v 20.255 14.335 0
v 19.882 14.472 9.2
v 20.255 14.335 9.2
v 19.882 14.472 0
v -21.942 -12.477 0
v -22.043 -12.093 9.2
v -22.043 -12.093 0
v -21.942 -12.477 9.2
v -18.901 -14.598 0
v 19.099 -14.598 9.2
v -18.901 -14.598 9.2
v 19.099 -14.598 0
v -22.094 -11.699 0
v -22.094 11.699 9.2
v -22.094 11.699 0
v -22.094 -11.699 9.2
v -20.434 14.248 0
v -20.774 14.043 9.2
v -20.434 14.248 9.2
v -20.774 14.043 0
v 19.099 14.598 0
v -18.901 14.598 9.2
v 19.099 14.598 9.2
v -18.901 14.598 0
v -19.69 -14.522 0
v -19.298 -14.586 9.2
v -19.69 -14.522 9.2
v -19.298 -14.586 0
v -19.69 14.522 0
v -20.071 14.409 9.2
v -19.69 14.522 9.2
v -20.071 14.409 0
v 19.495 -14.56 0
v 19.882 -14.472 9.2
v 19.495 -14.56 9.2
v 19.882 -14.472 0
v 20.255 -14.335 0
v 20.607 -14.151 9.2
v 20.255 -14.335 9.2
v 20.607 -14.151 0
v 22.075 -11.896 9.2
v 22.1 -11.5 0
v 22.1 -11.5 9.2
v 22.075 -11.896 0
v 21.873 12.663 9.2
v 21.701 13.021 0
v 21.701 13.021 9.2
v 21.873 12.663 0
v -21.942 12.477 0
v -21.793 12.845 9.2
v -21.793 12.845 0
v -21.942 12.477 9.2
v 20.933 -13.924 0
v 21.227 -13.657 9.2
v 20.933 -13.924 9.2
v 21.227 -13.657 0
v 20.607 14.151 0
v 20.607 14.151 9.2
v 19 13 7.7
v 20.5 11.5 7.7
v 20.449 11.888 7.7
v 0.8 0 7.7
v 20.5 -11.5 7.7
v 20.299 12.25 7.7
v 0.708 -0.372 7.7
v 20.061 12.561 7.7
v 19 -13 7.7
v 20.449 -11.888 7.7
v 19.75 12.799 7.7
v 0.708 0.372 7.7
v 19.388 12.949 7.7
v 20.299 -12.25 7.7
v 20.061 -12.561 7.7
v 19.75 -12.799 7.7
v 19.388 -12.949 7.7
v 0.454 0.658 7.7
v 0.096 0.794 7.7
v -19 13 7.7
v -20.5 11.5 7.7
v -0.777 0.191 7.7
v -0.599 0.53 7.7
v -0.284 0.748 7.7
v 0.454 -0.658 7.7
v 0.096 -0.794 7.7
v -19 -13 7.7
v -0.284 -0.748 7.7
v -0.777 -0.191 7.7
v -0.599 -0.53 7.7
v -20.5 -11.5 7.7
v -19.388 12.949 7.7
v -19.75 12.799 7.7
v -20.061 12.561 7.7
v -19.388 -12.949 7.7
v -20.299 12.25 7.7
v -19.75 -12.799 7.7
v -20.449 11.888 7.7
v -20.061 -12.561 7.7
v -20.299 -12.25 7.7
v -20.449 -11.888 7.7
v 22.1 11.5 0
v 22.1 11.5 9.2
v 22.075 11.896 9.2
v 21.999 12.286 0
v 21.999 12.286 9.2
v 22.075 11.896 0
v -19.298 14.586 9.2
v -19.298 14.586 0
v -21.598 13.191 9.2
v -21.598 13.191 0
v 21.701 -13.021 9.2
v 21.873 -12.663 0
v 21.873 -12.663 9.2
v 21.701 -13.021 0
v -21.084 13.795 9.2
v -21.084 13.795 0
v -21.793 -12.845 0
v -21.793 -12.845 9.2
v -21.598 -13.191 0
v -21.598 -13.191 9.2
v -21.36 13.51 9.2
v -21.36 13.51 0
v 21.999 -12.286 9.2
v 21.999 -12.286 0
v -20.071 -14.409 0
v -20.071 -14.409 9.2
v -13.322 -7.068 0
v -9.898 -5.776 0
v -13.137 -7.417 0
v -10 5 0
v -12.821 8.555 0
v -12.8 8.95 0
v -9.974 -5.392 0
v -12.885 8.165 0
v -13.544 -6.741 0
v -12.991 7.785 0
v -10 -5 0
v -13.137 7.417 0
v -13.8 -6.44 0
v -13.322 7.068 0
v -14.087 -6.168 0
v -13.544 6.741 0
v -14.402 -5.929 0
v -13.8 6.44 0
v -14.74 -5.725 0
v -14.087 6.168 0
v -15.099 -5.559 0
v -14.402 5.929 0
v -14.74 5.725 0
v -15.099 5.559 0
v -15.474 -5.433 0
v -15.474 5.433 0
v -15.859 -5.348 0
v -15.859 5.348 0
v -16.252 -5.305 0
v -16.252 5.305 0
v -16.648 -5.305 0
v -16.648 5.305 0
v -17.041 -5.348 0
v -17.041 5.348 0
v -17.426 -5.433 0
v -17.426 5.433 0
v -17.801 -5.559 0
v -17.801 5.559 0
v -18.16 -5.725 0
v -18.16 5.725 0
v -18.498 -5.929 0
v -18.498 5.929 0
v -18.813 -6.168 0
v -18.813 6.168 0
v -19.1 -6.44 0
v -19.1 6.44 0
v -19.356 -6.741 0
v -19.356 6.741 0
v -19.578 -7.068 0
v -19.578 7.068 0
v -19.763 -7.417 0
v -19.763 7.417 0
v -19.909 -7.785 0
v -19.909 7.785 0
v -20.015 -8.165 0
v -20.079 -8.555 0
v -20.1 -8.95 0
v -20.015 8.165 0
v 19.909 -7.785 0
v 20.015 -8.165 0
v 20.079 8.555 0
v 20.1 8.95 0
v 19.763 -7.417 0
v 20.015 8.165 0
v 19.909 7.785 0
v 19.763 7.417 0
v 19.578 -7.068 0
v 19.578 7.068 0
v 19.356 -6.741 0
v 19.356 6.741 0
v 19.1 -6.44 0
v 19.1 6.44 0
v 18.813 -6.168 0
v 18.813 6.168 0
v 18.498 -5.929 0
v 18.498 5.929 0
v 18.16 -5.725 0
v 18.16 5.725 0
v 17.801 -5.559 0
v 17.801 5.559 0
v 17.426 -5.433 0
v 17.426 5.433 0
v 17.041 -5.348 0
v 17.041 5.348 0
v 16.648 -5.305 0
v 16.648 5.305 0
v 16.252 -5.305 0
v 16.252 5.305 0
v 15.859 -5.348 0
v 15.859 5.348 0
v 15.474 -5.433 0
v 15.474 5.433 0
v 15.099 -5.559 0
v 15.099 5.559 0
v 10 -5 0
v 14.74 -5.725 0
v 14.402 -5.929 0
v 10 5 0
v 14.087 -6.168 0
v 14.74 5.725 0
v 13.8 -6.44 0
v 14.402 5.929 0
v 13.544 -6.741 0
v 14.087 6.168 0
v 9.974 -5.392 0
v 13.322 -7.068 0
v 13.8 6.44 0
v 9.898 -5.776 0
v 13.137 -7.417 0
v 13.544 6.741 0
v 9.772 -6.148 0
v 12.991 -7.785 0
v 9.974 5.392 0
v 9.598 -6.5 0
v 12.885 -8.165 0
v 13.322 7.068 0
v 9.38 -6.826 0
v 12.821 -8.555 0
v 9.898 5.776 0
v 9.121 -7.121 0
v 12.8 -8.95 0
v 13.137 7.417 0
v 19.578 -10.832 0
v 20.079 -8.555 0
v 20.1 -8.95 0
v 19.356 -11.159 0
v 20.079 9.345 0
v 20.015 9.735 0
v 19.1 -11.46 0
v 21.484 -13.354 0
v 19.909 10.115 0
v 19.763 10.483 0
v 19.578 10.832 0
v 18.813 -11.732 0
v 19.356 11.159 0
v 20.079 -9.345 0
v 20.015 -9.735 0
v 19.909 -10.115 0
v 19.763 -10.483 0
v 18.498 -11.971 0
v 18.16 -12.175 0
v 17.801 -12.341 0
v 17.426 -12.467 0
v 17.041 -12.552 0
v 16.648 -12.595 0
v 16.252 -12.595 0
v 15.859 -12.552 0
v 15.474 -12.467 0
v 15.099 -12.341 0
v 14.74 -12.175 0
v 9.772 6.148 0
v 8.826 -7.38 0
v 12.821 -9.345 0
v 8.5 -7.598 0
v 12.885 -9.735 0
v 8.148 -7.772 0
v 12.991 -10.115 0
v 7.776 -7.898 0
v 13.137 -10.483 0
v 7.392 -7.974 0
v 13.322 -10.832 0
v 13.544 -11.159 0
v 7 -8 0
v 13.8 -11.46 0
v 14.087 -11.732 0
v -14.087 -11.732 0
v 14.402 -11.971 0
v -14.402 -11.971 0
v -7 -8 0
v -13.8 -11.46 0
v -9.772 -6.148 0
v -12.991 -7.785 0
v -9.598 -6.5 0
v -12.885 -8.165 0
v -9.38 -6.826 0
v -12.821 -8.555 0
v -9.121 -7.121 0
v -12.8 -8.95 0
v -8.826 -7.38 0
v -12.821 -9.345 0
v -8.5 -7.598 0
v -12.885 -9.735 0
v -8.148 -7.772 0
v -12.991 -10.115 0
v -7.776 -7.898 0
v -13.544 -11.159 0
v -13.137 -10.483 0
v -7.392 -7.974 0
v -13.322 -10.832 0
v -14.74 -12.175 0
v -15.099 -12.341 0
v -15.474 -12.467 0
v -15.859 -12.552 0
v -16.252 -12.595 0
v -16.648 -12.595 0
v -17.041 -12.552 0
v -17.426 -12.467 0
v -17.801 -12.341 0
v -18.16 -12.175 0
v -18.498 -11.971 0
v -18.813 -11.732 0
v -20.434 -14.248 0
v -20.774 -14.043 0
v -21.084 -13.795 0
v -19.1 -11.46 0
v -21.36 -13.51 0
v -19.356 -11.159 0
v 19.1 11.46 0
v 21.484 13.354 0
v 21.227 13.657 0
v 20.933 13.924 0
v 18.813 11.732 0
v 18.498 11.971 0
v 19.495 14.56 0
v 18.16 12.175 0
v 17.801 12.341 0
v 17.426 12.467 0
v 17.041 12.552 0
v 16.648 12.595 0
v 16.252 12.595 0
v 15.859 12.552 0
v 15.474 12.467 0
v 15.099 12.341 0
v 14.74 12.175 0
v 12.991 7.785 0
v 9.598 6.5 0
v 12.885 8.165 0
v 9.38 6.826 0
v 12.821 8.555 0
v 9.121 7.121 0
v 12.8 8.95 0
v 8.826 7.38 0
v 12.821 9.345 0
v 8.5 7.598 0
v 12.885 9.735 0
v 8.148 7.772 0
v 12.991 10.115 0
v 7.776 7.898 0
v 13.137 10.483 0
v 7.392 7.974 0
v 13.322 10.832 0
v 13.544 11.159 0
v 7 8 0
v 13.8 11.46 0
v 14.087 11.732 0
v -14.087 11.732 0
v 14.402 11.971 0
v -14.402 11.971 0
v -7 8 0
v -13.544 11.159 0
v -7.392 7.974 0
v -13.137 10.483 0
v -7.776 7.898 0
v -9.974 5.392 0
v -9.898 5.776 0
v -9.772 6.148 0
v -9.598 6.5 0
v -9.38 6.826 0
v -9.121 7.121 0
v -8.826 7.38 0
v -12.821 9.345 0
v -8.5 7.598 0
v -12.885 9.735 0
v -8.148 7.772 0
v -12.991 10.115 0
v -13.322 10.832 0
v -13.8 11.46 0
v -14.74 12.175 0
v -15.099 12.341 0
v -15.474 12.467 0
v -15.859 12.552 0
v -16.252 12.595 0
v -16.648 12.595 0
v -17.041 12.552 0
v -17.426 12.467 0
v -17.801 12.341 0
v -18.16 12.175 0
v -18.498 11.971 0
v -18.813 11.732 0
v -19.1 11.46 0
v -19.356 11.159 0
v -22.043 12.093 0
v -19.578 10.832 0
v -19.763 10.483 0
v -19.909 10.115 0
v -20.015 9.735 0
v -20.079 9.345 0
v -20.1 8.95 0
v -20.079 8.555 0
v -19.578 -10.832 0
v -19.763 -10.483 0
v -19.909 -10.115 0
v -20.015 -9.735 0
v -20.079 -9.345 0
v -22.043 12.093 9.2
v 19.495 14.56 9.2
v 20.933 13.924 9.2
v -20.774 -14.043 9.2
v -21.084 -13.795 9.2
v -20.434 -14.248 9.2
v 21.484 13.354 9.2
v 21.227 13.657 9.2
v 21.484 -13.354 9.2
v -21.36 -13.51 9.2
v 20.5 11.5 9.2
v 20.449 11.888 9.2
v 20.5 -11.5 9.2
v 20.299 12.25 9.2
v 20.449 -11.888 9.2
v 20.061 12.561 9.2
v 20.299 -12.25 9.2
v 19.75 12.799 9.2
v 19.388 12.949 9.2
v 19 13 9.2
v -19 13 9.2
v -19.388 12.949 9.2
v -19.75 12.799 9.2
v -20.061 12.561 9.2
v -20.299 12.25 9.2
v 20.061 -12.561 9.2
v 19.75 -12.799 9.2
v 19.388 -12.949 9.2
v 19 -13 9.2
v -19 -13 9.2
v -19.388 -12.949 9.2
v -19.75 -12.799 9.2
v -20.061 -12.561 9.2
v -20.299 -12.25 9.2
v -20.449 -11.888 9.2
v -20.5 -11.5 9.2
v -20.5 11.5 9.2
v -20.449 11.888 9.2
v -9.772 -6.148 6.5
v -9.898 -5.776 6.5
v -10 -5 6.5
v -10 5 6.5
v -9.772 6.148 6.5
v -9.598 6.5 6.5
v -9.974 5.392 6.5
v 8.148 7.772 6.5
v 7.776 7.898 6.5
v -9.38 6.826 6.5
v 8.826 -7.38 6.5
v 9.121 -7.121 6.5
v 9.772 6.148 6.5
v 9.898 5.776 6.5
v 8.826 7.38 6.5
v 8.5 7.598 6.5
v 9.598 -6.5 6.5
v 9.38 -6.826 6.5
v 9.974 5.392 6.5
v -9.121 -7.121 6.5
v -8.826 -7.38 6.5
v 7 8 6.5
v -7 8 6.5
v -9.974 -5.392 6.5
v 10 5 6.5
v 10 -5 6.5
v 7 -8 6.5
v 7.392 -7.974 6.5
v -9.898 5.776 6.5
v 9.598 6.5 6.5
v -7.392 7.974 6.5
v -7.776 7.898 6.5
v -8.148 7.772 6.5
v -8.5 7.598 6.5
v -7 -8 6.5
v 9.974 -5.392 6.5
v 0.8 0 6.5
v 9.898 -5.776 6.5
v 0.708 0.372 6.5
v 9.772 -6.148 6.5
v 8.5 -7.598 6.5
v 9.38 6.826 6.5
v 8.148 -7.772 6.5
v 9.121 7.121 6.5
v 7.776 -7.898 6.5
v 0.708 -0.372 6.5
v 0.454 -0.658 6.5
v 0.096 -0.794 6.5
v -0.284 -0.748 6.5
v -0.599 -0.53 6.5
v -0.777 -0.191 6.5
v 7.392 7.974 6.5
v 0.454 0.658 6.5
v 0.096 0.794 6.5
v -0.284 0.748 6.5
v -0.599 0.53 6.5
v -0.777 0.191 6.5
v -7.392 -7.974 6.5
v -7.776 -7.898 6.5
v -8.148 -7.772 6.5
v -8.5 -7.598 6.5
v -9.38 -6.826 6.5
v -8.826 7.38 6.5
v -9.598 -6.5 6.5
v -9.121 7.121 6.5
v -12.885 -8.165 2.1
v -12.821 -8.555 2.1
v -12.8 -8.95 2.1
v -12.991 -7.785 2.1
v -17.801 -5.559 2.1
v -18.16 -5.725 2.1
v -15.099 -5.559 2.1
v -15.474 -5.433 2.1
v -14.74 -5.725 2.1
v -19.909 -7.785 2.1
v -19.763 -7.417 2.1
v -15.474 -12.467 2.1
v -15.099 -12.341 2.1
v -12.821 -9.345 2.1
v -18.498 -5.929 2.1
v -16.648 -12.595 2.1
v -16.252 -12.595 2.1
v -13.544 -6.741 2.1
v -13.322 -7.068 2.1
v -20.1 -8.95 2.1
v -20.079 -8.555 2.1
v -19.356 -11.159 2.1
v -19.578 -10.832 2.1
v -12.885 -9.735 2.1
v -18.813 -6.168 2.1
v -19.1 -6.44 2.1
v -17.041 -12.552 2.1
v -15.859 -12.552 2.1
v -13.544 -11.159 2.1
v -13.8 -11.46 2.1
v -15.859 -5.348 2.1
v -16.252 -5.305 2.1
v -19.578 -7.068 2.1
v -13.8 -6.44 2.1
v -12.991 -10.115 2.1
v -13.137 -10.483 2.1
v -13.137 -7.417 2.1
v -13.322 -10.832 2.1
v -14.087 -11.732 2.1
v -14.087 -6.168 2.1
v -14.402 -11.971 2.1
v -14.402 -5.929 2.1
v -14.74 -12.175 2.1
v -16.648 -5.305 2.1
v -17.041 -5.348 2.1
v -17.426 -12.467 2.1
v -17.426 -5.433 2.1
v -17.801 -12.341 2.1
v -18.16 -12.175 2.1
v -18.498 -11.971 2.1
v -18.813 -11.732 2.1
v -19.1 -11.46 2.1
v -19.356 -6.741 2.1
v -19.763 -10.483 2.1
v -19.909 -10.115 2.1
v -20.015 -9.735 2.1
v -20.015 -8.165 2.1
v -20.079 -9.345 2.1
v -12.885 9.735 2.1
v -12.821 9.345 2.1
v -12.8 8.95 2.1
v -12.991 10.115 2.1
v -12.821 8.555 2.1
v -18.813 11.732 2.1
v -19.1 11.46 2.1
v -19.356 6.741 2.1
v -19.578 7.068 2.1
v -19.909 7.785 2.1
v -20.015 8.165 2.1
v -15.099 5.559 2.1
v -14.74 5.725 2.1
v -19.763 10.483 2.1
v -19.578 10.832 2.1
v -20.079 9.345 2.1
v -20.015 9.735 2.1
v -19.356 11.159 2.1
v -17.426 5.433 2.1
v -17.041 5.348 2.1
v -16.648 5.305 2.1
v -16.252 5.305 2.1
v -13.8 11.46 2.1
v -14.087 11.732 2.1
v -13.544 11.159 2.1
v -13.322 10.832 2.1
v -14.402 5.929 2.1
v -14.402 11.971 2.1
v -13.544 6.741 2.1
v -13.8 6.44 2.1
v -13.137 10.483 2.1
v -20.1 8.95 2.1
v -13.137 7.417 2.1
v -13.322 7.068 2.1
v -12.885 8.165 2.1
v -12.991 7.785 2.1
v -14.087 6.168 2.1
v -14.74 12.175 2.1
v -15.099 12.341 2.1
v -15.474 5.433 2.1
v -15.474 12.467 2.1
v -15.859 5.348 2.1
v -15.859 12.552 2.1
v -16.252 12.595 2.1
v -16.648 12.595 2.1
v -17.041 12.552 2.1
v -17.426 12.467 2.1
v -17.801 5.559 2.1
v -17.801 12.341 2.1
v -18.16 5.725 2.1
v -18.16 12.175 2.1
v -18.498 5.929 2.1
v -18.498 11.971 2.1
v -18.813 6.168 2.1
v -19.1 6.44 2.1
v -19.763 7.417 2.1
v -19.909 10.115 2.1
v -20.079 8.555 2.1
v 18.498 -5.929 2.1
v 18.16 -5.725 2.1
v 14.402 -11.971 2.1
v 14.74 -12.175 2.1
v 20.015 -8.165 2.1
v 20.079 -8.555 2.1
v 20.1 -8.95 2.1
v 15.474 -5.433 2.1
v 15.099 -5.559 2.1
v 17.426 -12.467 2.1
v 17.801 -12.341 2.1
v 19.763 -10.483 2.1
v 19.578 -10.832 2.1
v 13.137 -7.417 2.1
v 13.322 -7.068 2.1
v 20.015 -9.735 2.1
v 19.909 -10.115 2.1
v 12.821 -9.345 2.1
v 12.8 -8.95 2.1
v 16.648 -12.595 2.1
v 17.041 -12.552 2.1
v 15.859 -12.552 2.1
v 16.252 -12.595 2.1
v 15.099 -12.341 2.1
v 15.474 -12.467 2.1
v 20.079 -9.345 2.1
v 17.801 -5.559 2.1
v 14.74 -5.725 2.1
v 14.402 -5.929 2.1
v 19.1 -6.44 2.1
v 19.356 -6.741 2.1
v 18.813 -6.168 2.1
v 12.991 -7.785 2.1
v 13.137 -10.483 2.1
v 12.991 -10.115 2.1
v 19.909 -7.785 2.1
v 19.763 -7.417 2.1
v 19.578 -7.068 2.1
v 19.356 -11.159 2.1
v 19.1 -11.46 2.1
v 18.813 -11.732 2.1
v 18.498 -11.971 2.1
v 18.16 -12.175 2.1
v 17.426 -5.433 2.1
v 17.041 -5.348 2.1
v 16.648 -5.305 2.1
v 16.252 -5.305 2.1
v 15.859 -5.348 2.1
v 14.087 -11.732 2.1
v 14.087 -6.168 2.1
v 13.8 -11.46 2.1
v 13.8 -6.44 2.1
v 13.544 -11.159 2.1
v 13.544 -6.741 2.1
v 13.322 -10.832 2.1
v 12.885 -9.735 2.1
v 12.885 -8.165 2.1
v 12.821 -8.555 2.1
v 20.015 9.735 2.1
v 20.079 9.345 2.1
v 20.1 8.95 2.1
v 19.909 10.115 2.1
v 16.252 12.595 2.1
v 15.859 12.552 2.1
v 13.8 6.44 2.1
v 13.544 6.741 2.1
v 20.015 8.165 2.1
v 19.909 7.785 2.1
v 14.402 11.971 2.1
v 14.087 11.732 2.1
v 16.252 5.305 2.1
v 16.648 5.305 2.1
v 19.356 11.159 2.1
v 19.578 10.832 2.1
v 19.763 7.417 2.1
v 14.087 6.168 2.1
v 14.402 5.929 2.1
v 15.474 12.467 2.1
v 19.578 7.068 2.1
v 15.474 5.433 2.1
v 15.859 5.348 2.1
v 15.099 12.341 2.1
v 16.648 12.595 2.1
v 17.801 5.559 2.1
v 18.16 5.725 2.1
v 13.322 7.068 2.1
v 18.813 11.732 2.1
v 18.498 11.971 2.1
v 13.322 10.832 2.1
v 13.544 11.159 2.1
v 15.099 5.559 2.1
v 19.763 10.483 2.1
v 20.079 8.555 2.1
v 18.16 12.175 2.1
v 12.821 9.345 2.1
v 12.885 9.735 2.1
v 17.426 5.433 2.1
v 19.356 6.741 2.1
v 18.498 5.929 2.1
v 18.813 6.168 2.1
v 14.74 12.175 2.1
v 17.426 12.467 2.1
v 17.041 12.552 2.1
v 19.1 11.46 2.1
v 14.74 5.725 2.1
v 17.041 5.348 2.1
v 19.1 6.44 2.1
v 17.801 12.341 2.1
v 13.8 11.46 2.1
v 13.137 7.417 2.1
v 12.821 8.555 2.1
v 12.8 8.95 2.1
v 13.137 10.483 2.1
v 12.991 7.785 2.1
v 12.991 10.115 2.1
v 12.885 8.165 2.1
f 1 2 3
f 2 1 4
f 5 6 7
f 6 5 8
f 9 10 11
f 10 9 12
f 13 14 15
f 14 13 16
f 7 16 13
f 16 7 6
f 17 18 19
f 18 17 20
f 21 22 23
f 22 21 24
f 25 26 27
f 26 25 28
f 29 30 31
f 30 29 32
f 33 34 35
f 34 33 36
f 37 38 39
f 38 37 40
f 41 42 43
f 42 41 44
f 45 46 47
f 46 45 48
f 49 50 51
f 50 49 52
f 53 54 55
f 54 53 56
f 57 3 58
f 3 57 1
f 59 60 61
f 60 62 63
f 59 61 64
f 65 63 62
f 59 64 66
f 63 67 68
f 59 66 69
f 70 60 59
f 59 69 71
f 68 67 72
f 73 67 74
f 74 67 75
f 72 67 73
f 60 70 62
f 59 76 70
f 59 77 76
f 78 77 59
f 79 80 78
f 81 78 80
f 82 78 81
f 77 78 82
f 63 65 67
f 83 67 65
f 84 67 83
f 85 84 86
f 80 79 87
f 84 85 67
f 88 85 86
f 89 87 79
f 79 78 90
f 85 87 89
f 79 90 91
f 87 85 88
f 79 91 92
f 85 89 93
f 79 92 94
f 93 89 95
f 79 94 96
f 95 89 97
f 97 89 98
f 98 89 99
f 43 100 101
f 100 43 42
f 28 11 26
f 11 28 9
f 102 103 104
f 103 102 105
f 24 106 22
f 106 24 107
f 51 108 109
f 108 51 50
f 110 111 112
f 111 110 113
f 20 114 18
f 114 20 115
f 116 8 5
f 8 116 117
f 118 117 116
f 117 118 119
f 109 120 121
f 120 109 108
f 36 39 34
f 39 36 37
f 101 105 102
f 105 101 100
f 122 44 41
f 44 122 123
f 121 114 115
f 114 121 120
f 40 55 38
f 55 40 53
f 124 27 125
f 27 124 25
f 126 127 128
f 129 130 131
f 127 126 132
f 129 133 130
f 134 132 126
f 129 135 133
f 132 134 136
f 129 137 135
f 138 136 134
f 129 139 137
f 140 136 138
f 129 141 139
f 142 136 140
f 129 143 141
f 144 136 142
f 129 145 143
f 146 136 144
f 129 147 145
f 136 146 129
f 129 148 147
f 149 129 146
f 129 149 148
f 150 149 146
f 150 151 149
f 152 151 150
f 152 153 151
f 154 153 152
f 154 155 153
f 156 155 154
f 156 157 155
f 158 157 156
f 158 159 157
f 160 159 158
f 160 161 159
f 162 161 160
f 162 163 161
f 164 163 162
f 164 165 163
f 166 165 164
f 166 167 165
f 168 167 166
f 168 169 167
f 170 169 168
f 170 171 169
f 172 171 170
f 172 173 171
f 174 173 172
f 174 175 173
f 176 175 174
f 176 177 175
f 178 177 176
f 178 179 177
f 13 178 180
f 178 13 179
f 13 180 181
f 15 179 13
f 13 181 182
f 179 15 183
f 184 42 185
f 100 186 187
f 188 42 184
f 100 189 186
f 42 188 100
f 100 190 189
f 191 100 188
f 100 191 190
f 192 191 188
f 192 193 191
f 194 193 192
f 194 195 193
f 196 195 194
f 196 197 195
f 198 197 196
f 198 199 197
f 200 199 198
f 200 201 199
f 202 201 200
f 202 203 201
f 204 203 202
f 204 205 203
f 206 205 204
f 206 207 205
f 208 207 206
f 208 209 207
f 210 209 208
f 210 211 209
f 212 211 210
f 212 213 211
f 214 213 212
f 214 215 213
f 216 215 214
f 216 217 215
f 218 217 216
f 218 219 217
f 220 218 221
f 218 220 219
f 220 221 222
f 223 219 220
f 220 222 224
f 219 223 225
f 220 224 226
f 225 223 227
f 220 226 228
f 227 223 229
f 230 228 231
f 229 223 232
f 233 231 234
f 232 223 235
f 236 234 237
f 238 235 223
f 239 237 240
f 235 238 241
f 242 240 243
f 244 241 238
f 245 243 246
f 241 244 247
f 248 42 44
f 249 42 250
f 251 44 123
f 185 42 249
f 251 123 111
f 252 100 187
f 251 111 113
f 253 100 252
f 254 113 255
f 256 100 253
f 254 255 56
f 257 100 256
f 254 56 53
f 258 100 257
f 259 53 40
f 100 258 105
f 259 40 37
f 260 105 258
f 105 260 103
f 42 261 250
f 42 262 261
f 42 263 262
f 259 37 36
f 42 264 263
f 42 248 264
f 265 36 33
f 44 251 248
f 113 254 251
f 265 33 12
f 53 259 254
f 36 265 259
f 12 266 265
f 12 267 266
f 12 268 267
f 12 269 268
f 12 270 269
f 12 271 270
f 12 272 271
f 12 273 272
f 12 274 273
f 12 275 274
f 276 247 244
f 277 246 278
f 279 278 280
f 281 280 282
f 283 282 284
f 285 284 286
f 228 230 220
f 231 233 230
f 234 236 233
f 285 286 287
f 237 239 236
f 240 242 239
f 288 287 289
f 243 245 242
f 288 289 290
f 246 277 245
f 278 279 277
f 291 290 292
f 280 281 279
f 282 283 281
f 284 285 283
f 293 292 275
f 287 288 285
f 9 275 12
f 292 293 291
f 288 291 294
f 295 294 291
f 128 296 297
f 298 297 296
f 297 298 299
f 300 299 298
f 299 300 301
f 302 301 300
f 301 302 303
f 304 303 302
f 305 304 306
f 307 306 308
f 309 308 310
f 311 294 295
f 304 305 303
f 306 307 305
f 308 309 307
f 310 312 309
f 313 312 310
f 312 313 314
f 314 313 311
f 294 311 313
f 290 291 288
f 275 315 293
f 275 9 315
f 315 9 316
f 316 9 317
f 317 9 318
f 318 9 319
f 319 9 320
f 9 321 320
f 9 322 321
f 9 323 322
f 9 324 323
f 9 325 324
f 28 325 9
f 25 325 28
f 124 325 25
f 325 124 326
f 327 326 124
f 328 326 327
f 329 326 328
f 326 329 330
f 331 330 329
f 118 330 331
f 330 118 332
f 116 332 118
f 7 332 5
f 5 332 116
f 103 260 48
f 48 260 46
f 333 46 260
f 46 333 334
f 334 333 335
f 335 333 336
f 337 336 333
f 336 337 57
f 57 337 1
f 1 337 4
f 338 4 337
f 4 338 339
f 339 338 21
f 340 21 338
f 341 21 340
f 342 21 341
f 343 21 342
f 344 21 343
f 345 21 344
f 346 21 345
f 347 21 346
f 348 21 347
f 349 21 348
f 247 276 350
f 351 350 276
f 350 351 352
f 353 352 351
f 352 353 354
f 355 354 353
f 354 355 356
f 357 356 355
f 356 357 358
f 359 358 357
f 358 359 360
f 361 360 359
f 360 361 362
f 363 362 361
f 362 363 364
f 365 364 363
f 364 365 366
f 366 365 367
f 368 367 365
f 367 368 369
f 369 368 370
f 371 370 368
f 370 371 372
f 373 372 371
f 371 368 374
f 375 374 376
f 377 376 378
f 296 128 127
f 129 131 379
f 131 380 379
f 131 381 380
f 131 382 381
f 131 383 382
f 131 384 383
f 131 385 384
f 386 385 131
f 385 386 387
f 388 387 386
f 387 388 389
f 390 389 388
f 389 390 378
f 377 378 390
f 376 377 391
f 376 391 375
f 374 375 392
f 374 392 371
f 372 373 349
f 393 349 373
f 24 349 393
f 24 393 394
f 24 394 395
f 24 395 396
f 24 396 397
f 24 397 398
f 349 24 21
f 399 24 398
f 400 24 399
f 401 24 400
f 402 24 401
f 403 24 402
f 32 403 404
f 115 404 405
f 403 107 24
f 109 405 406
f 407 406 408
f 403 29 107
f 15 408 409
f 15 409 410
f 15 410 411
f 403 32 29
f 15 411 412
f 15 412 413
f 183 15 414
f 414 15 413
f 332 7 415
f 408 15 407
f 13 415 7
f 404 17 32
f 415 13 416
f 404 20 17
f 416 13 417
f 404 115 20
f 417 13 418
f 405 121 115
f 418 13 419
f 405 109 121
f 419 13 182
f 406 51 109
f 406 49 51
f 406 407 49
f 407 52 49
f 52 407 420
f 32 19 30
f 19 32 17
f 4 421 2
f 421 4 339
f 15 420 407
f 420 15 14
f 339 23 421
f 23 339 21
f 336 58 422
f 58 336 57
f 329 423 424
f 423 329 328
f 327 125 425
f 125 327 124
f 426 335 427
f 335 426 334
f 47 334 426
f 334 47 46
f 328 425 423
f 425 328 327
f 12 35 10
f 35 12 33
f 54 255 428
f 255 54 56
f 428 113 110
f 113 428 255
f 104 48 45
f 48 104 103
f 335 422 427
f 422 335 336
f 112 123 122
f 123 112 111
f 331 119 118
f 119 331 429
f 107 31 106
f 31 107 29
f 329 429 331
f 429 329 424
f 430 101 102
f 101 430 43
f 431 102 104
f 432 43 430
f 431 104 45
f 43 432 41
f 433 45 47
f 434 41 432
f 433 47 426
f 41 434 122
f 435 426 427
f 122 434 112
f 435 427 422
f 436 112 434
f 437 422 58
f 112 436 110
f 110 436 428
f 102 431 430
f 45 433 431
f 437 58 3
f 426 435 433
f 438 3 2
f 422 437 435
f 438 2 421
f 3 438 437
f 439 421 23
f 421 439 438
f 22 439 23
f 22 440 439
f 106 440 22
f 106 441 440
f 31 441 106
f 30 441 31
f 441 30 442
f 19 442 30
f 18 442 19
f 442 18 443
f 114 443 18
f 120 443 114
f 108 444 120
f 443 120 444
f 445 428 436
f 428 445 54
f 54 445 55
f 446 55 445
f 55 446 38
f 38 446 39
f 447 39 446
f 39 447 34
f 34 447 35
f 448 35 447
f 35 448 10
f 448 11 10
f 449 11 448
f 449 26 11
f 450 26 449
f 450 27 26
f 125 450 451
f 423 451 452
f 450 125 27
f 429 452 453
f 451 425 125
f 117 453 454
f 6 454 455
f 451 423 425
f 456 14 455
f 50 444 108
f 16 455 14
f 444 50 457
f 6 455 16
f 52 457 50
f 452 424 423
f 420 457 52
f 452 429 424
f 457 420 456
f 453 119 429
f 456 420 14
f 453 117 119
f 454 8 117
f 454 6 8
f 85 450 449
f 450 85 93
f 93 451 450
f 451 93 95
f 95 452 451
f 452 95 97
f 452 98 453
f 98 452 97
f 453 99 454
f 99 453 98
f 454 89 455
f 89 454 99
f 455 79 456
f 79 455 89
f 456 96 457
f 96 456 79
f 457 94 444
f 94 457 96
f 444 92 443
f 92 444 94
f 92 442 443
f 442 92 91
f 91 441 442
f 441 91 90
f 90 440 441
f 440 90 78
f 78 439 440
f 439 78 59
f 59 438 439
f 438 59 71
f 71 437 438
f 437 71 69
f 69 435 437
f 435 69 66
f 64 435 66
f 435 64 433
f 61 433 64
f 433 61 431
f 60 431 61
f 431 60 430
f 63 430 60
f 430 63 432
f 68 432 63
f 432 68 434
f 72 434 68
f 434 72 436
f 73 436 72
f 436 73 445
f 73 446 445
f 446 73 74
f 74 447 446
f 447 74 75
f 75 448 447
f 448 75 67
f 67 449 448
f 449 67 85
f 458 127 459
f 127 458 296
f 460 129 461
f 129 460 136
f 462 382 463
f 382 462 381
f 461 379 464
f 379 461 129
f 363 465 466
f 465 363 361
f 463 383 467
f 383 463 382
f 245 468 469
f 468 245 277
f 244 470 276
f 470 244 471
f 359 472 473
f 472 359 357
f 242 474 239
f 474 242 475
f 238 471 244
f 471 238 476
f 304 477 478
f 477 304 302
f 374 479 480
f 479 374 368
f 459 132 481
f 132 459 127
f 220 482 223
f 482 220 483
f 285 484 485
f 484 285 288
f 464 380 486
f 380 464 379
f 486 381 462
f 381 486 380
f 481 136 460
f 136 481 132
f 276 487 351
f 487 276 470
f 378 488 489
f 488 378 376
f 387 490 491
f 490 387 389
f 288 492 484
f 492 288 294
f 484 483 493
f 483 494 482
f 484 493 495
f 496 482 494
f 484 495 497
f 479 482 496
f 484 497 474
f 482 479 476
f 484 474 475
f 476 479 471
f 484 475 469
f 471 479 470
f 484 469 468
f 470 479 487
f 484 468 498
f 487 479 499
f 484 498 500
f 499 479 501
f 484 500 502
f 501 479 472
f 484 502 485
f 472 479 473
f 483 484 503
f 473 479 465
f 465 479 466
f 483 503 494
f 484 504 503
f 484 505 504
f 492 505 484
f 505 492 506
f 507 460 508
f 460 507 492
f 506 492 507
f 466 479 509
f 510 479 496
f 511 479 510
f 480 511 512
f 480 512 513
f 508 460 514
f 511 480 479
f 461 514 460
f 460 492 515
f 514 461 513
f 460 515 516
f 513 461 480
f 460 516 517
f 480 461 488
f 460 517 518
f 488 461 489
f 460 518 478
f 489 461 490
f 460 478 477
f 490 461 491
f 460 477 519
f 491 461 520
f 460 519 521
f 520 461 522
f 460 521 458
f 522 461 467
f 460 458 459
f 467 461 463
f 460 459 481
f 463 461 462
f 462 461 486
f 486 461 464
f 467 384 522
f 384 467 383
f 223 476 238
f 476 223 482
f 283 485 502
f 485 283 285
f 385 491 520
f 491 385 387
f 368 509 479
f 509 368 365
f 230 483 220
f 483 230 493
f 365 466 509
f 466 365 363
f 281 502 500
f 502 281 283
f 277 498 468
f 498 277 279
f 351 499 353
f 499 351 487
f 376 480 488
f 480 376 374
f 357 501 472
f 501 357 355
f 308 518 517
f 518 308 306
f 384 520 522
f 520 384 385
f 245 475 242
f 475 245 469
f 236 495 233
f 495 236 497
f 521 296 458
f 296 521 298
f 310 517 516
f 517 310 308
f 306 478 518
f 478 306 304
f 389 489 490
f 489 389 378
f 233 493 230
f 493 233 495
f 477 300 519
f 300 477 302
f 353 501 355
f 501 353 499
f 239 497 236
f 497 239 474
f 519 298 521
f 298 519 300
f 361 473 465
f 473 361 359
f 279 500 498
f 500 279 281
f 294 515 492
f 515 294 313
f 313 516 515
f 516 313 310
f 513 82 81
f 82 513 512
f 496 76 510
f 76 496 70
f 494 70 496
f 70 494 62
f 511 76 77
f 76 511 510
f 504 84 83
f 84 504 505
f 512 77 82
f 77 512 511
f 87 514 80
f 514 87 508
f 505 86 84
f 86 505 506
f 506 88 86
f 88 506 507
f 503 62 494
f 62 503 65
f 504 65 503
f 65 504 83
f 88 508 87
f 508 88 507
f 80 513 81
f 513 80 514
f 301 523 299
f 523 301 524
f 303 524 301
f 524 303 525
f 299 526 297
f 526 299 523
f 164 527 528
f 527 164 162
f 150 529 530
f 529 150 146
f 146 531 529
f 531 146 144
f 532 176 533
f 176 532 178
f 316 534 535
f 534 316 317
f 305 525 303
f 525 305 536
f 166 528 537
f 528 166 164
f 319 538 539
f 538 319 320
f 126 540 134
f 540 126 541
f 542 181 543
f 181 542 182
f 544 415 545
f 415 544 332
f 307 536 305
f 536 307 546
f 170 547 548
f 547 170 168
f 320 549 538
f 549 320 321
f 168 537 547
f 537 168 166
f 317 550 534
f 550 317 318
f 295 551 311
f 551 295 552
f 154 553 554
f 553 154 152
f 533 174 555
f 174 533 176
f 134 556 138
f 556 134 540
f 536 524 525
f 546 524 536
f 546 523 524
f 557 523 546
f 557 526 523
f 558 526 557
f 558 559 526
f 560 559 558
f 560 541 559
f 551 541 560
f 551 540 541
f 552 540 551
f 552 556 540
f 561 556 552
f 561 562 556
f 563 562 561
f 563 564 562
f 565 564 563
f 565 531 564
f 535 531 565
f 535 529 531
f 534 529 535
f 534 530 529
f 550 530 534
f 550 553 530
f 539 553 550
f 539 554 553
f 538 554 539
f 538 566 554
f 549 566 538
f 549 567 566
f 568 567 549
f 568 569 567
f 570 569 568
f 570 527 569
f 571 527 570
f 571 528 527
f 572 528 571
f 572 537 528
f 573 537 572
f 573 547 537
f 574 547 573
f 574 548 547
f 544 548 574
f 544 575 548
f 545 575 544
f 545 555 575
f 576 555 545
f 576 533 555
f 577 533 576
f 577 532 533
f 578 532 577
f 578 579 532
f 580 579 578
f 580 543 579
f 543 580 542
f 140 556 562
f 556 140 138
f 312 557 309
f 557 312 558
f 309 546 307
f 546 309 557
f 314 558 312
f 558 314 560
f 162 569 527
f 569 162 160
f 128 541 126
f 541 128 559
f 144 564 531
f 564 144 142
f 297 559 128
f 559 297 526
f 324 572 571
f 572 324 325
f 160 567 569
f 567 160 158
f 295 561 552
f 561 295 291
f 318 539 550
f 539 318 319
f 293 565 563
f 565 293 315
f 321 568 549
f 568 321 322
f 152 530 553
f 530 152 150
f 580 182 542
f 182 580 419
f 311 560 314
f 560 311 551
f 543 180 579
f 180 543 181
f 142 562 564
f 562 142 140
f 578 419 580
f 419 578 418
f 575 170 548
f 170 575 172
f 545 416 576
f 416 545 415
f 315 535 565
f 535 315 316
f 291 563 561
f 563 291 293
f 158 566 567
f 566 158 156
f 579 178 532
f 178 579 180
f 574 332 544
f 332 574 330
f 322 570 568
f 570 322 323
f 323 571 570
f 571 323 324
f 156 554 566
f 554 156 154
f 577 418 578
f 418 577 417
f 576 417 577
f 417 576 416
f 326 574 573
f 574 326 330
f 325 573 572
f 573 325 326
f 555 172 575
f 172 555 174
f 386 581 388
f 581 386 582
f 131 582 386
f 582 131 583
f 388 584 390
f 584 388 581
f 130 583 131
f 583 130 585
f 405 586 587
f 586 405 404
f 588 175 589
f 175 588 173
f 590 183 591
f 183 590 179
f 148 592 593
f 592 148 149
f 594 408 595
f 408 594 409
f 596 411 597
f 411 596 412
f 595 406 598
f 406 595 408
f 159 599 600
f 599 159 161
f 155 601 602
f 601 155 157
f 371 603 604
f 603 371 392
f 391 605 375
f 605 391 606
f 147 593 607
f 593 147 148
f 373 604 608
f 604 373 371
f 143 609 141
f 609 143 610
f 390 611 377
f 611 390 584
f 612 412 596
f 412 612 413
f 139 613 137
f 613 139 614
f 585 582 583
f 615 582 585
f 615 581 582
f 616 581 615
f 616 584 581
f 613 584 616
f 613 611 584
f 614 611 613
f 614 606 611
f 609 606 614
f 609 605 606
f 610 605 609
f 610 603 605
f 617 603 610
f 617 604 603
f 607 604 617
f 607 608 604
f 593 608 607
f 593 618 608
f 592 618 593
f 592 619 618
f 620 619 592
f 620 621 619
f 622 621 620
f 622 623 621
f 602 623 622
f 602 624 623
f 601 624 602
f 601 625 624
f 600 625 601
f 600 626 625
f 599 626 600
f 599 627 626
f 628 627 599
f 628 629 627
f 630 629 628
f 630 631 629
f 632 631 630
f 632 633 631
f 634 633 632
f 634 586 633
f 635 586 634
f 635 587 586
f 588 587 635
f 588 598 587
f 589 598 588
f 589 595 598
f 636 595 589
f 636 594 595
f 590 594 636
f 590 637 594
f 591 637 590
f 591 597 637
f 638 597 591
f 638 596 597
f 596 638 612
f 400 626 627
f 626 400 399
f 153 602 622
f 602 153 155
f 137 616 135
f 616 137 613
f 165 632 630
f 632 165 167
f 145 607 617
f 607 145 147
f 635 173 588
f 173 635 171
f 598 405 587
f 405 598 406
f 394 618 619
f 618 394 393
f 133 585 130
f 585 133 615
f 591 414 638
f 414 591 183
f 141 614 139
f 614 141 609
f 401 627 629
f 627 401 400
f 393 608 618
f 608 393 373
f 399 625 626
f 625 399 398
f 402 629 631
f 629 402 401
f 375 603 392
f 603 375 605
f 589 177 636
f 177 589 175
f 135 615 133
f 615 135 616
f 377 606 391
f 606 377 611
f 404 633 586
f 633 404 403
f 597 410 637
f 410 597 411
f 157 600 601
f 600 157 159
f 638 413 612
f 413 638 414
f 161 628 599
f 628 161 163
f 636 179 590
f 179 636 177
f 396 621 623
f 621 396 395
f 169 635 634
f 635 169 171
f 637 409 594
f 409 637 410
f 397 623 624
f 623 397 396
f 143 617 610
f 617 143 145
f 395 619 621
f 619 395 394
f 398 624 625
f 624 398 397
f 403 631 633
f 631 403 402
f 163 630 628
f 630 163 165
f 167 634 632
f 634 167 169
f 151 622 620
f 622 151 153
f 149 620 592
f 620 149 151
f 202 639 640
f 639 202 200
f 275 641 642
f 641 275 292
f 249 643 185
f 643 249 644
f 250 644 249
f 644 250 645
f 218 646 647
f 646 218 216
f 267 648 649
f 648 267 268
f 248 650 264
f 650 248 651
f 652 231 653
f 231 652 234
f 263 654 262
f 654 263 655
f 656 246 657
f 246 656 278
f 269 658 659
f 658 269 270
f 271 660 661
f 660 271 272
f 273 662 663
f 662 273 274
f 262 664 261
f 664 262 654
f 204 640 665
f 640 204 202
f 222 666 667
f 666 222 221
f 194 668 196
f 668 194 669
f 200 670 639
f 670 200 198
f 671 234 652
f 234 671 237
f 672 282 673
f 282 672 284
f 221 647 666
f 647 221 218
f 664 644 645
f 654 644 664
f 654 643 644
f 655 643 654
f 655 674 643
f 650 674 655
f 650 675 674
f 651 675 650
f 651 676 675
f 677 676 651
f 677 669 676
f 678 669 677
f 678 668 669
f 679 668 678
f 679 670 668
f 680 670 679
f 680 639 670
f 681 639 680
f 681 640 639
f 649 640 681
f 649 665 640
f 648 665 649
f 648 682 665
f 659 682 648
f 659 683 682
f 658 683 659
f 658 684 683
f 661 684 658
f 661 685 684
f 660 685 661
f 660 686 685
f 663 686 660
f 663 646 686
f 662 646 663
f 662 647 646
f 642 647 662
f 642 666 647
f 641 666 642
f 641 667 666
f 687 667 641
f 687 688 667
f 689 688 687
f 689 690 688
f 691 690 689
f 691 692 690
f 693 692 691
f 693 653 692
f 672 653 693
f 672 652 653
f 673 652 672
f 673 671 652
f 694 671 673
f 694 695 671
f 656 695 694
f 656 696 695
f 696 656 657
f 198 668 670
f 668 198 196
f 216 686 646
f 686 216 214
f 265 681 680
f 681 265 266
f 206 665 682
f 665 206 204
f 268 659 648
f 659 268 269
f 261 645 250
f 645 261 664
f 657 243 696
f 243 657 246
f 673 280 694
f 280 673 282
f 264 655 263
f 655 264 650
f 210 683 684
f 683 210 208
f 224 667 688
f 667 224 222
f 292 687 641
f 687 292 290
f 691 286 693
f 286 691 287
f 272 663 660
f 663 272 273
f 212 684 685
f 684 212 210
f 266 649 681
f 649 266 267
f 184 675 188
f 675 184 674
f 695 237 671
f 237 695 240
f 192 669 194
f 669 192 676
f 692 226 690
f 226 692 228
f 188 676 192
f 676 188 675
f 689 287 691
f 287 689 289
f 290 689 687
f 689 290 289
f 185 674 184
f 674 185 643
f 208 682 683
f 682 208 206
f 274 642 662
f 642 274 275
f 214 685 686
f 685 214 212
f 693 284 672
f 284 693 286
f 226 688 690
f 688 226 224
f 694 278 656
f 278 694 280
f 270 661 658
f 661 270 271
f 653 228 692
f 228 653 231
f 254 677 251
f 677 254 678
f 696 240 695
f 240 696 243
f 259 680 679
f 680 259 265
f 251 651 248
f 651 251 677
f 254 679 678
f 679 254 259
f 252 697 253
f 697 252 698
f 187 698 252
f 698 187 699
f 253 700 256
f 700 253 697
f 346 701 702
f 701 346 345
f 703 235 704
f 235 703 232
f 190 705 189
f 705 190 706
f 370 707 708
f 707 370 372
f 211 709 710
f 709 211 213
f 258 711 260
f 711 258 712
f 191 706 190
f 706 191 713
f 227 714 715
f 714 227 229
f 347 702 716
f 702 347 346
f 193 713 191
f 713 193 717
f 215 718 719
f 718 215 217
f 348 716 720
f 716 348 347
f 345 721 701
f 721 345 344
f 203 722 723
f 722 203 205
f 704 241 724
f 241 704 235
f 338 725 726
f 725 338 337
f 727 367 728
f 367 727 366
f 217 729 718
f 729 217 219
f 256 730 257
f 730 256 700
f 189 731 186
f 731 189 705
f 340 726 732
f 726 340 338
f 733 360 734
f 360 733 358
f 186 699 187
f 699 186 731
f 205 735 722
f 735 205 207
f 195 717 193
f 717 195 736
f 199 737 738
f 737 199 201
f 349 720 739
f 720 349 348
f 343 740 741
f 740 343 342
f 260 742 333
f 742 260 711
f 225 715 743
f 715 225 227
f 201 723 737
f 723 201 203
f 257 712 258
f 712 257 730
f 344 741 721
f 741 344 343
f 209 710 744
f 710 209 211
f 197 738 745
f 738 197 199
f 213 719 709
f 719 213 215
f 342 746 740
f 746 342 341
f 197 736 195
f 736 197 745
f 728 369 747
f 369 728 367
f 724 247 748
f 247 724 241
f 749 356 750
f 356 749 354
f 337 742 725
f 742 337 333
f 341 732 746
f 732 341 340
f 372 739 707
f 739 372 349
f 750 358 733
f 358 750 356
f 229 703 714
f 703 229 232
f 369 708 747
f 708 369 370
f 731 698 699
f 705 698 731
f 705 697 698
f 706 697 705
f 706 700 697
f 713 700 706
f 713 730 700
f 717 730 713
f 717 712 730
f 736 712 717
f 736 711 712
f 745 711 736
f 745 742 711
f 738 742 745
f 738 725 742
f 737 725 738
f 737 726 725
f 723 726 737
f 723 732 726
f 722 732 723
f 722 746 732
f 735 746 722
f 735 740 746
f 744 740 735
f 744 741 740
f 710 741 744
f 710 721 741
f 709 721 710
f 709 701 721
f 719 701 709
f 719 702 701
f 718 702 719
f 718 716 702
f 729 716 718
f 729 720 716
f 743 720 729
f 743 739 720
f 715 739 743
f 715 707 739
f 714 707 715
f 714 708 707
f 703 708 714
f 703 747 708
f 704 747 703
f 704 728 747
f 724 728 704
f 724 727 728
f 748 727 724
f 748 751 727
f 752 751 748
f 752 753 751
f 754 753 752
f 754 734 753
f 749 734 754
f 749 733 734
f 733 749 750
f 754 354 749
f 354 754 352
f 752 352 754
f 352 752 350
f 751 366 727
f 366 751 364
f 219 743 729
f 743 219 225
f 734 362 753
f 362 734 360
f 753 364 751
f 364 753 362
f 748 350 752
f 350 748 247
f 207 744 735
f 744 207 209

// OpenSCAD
// Magnetsockel für rechteckigen Ansteck-Pin (Standard: 40 x 25 mm)
// Macht aus einem Ansteck-Pin einen Kühlschrankmagneten, OHNE den Pin zu
// verändern: der Pin behält Nadel und Schmetterlings-Clutch.
// Alle Maße in Millimetern (Regel: units-mm)
//
// Änderungen gegenüber 001 (Nutzer-Feedback nach Druck):
//   - pin_fit 0.3 -> 0.5 mm pro Seite: Pin passte nicht ganz in den Rand.
//     (0.3 nominal minus eff. XY-Fehler ~0.15-0.2/Seite ließ kaum Luft.)
//   - Griffkerbe im Rand entfernt (Rand jetzt geschlossen umlaufend).
//   - Clutch-Mulde mit mehr Puffer: Pin/Clutch stand hinten noch über.
//     Tiefe: +0.5 -> +1.5 mm unter der Clutch (clutch_gap_z),
//     seitlich: 1 -> 2 mm Luft pro Seite (clutch_gap_xy).
//     Dadurch wird der Sockel 1 mm dicker.
//
// Kontext (Regel: context-first), Stand bei Erstellung:
//   - context/printer.md:    Anycubic Kobra S1, 0.4mm Düse, PEI, 250mm Bauraum
//   - context/tolerances.md: Presspassung 0.05–0.15mm/Seite, bewegliche
//                            Passung 0.2–0.25mm/Seite, eff. XY-Fehler
//                            ~0.15–0.2mm/Seite
//   - context/materials.md:  noch leer -> PLA
//
// Anforderungen aus dem Design-Dialog:
//   - Pin rechteckig 40 x 25 mm, ein Nadelstift mit Schmetterlings-Clutch
//   - Halt am Sockel: Nadel durch eine dünne Platte stecken, Clutch dahinter
//     aufsetzen – genau wie auf Stoff. Fest, aber jederzeit abnehmbar,
//     kein Kleber, keine Änderung am Pin.
//   - Sockel haftet mit Magneten auf einer Metallfläche (Kühlschrank)
//   - Magnete: 7 x 2 mm rund (vorhanden), werden eingeklebt
//
// Funktionsprinzip / Aufbau (Z = 0 liegt am Kühlschrank):
//   z 0 .. pocket_d    Clutch-Mulde: nach hinten offene Wanne, in der der
//                      Schmetterling sitzt. Offen, damit man ihn mit den
//                      Fingern oder einer Pinzette aufdrücken kann.
//   z 0 .. 2.1         Magnettaschen, nach hinten offen -> Magnet liegt
//                      direkt (0.1mm zurückgesetzt) an der Metallfläche an,
//                      das ist die maximale Haltekraft.
//   pocket_d .. base_t Klemmplatte (plate_t) mit dem Nadelloch – das ist der
//                      "Stoff", auf den die Clutch klemmt.
//   base_t .. +rim_h   Umlaufender Rand, in dem der Pin liegt. Verhindert,
//                      dass sich der Pin um die einzelne Nadel verdreht.
//
// Montage:
//   1. Magnete einkleben (alle mit derselben Polung nach außen, sonst
//      schwächen sie sich gegenseitig). Sie dürfen nicht überstehen –
//      die Tasche ist 0.1mm tiefer als der Magnet.
//   2. Clutch vom Pin abziehen, Nadel von vorne durch das Nadelloch stecken,
//      Pin flach in den Rand legen.
//   3. Von hinten die Clutch in der Mulde wieder auf die Nadel drücken.
//
// Druckausrichtung: Rückseite (Magnetseite) auf dem Druckbett, Pin-Auflage
//   nach oben. Keine Stützen nötig. Gebrückt werden nur die Magnettaschen
//   (Ø7.3mm) und die Decke der Clutch-Mulde (Spannweite = pocket_h, ~14mm) –
//   beides unkritisch (printer.md nennt Durchhang erst bei 50mm+).
//   Die plane Rückseite liegt auf dem PEI = gute Haftung und exakt die
//   Fläche, die später am Kühlschrank anliegt.
//
// ZUERST MESSEN (Messschieber) und unten eintragen, dann part="test"
// drucken (~2 Minuten) und die Clutch-Klemmung prüfen:
//   - needle_d   Nadeldurchmesser
//   - needle_len freie Nadellänge ab Pin-Rückseite
//   - clutch_d   Breite der Clutch mit ausgeklappten Flügeln
//   - clutch_h   Bauhöhe der Clutch, auf der Nadel sitzend
//   - pin_w/pin_h/pin_corner_r  Außenmaße und Eckenradius des Pins
//   - needle_off_x/y  Versatz der Nadel aus der Pin-Mitte (oft nicht mittig!)

/* [Pin] */
// Breite des Pins (X)
pin_w = 40;
// Höhe des Pins (Y)
pin_h = 25;
// Eckenradius des Pins. Im Zweifel klein lassen - eine zu runde Aussparung
// klemmt an den Ecken, eine zu eckige laesst nur eine Fuge sichtbar.
pin_corner_r = 1.0;
// Nadelversatz aus der Pin-Mitte in X
needle_off_x = 0;
// Nadelversatz aus der Pin-Mitte in Y
needle_off_y = 0;
// Nadeldurchmesser
needle_d = 1.2;
// Freie Nadellaenge ab Pin-Rueckseite
needle_len = 6.0;
// Breite der Clutch mit ausgeklappten Fluegeln
clutch_d = 12.0;
// Bauhoehe der Clutch auf der Nadel
clutch_h = 5.0;

/* [Magnete] */
// Magnetdurchmesser
magnet_d = 7.0;
// Magnetdicke
magnet_t = 2.0;
// Anzahl Magnete bei automatischer Platzierung
magnet_count = 4; // [2, 4]
// Magnetpositionen [x,y] relativ zur Sockelmitte. Leer = automatisch in die
// Ecken. Bei stark aussermittiger Nadel kollidieren die automatischen
// Positionen evtl. mit der Clutch-Mulde - dann hier von Hand setzen,
// Die Pruefung unten meldet jede Kollision mit Nummer und Abstand.
// Geprueftes Beispiel fuer needle_off_x=8, needle_off_y=4 (Pin 40x25):
//   magnet_pos = [[-16.25, 8.75], [-16.25, -8.75], [8, -9]]
magnet_pos = [];

/* [Sockel] */
// Hoehe des Randes um den Pin. Sinnvoll: etwa die Dicke des Pins, hoechstens
// so hoch wie der Pin dick ist - sonst steht der Rand vor dem Pin.
// 0 = kein Rand, dann haelt nur die Clutch (Pin kann sich dann verdrehen).
rim_h = 1.5;
// Wandstaerke des Randes
rim_t = 1.6;
// Luft zwischen Pin und Rand pro Seite
pin_fit = 0.5;
// Dicke der Klemmplatte (der "Stoff" fuer die Clutch)
plate_t = 1.2;
// Luft um die Clutch in der Mulde, seitlich pro Seite
clutch_gap_xy = 2.0;
// Luft unter der Clutch bis zur Rueckseite (Clutch darf nie ueberstehen)
clutch_gap_z = 1.5;
// Zusaetzlicher Platz in der Clutch-Mulde zum Zugreifen (Finger/Pinzette).
// Bei kleineren Pins verkleinern, dann passen die Magnete wieder daneben.
clutch_access = 8;

/* [Ausgabe] */
// sockel = fertiges Teil, test = kleiner Pruefkoerper nur fuer Nadel+Clutch
part = "sockel"; // [sockel, test]

/* [Hidden] */
$fa = 2;
$fs = 0.4;
eps = 0.01;

// ---- abgeleitete Maße -------------------------------------------------
// Nadelloch etwas groesser als die Nadel: es soll nicht klemmen, das Halten
// uebernimmt die Clutch. Der Rand verhindert das Verdrehen.
needle_hole_d   = needle_d + 0.4;
// Magnettaschen: 0.3mm Uebermaß zum Einkleben (wie kartenbox_*: 6mm -> 6.3),
// 0.1mm tiefer als der Magnet, damit nichts uebersteht.
magnet_pocket_d = magnet_d + 0.3;
magnet_pocket_t = magnet_t + 0.1;
// Rand-Abstand der Magnettaschen zur Außenkante
magnet_wall     = 2.0;

// Clutch-Mulde: rundum Luft um die Clutch, zusaetzlich Zugriff fuer Finger
// bzw. Pinzette. Deshalb deutlich groesser als die Clutch selbst.
pocket_w = max(clutch_d + clutch_access, clutch_d + 2 * clutch_gap_xy);
pocket_h = max(clutch_d + 2 * clutch_gap_xy, 12);
pocket_r = 3;
// Tiefe: die Clutch muss komplett versenkt sein UND die Nadelspitze darf
// nicht hinten herausstehen (sonst kratzt sie am Kuehlschrank).
pocket_d = max(clutch_h + clutch_gap_z, needle_len - plate_t + clutch_gap_z);

base_t = plate_t + pocket_d;
base_w = pin_w + 2 * (pin_fit + rim_t);
base_h = pin_h + 2 * (pin_fit + rim_t);
base_r = pin_corner_r + pin_fit + rim_t;

recess_w = pin_w + 2 * pin_fit;
recess_h = pin_h + 2 * pin_fit;
recess_r = pin_corner_r + pin_fit;

magnet_x_auto = base_w / 2 - magnet_pocket_d / 2 - magnet_wall;
magnet_y_auto = base_h / 2 - magnet_pocket_d / 2 - magnet_wall;
magnets = (len(magnet_pos) > 0) ? magnet_pos
        : (magnet_count == 4)
          ? [for (sx = [-1, 1], sy = [-1, 1])
                [sx * magnet_x_auto, sy * magnet_y_auto]]
          : [for (sx = [-1, 1]) [sx * magnet_x_auto, 0]];

// ---- Pruefungen -------------------------------------------------------
// Vorzeichenbehafteter Abstand eines Punktes zum Rand eines abgerundeten
// Rechtecks (negativ = innerhalb). Damit wird echt in 2D geprueft, ob eine
// Magnettasche die Clutch-Mulde anschneidet bzw. aus dem Sockel laeuft -
// eine reine X- oder Y-Betrachtung uebersieht die Diagonale.
function sdf_rrect(p, c, hw, hh, r) =
    let (dx = abs(p[0] - c[0]) - (hw - r),
         dy = abs(p[1] - c[1]) - (hh - r))
    sqrt(pow(max(dx, 0), 2) + pow(max(dy, 0), 2)) + min(max(dx, dy), 0) - r;

// Abstand Magnettasche <-> Clutch-Mulde (Material dazwischen)
gap_pocket = [for (m = magnets)
    sdf_rrect(m, [needle_off_x, needle_off_y], pocket_w / 2, pocket_h / 2,
              pocket_r) - magnet_pocket_d / 2];
// Abstand Magnettasche <-> Außenkante des Sockels
gap_edge = [for (m = magnets)
    -sdf_rrect(m, [0, 0], base_w / 2, base_h / 2, base_r)
    - magnet_pocket_d / 2];

for (i = [0 : len(magnets) - 1]) {
    assert(gap_pocket[i] >= 0.8,
           str("Magnet ", i, " bei ", magnets[i],
               " schneidet die Clutch-Mulde an (Abstand ", gap_pocket[i],
               "mm, noetig 0.8). Abhilfe: clutch_access kleiner, kleinere ",
               "Magnete, magnet_pos von Hand setzen oder magnet_count=2."));
    assert(gap_edge[i] >= 1.2,
           str("Magnet ", i, " bei ", magnets[i],
               " liegt zu nah an der Außenkante (Wand ", gap_edge[i],
               "mm, noetig 1.2)."));
}
// Mulde muss mit Restwand innerhalb des Sockels liegen
assert(-sdf_rrect([needle_off_x + pocket_w / 2, needle_off_y + pocket_h / 2],
                  [0, 0], base_w / 2, base_h / 2, base_r) >= 0
       && abs(needle_off_x) + pocket_w / 2 <= base_w / 2 - 2.0
       && abs(needle_off_y) + pocket_h / 2 <= base_h / 2 - 2.0,
       "Clutch-Mulde passt nicht in den Sockel (Pin zu klein oder Nadel zu weit aussen).");
// Material ueber dem Magneten
assert(base_t - magnet_pocket_t >= 1.2,
       "Zu wenig Material ueber den Magnettaschen.");
// Nadelspitze darf nicht hinten herausstehen
assert(pocket_d - (needle_len - plate_t) >= 0.4,
       "Nadel steht hinten heraus - pocket_d/needle_len pruefen.");
// Wandstaerken (Regel: printability-report) - 2x Duesendurchmesser = 0.8mm
assert(rim_t >= 0.8 && plate_t >= 0.8,
       "Wandstaerke unter 0.8mm (2x Duese 0.4mm).");

echo(str("--- pin_magnetsockel: Sockel ", base_w, " x ", base_h,
         " x ", base_t + rim_h, " mm ---"));
echo(str("Klemmplatte ", plate_t, "mm, Clutch-Mulde ", pocket_w, " x ",
         pocket_h, " x ", pocket_d, "mm tief"));
echo(str("Nadelspitze endet ", pocket_d - (needle_len - plate_t),
         "mm vor der Rueckseite"));
echo(str("Magnete: ", len(magnets), "x ", magnet_d, "x", magnet_t,
         " bei ", magnets));
echo(str("Wand Magnet->Mulde ", gap_pocket, "mm, Magnet->Außenkante ",
         gap_edge, "mm"));
echo(str("Bruecken: Magnettasche ", magnet_pocket_d, "mm, Muldendecke ",
         pocket_h, "mm - beide unkritisch"));

// ---- Hilfsmodule ------------------------------------------------------
module rrect(w, h, r) {
    hull() for (x = [-1, 1], y = [-1, 1])
        translate([x * (w / 2 - r), y * (h / 2 - r)]) circle(r = r);
}

// Clutch-Mulde + Nadelloch, als Werkzeug zum Abziehen
module clutch_cuts() {
    translate([needle_off_x, needle_off_y, -eps])
        linear_extrude(pocket_d + eps)
            rrect(pocket_w, pocket_h, pocket_r);
    translate([needle_off_x, needle_off_y, -eps])
        cylinder(d = needle_hole_d, h = base_t + 2 * eps);
}

// ---- Teile ------------------------------------------------------------
module sockel() {
    render(convexity = 8)
    difference() {
        union() {
            linear_extrude(base_t) rrect(base_w, base_h, base_r);
            if (rim_h > 0)
                translate([0, 0, base_t]) linear_extrude(rim_h)
                    difference() {
                        rrect(base_w, base_h, base_r);
                        rrect(recess_w, recess_h, recess_r);
                    }
        }
        clutch_cuts();
        // Magnettaschen, nach hinten offen
        for (m = magnets)
            translate([m[0], m[1], -eps])
                cylinder(d = magnet_pocket_d, h = magnet_pocket_t + eps);
    }
}

// Pruefkoerper: nur Klemmplatte + Mulde + Nadelloch, gleiche Dicken wie am
// Sockel. Damit vor dem Volldruck testen, ob die Clutch sicher greift und
// ob die Nadel lang genug ist.
module test_chip() {
    render(convexity = 6)
    difference() {
        translate([needle_off_x, needle_off_y, 0])
            linear_extrude(base_t) rrect(pocket_w + 8, pocket_h + 6, 3);
        clutch_cuts();
    }
}

if (part == "sockel") sockel();
else if (part == "test") test_chip();
